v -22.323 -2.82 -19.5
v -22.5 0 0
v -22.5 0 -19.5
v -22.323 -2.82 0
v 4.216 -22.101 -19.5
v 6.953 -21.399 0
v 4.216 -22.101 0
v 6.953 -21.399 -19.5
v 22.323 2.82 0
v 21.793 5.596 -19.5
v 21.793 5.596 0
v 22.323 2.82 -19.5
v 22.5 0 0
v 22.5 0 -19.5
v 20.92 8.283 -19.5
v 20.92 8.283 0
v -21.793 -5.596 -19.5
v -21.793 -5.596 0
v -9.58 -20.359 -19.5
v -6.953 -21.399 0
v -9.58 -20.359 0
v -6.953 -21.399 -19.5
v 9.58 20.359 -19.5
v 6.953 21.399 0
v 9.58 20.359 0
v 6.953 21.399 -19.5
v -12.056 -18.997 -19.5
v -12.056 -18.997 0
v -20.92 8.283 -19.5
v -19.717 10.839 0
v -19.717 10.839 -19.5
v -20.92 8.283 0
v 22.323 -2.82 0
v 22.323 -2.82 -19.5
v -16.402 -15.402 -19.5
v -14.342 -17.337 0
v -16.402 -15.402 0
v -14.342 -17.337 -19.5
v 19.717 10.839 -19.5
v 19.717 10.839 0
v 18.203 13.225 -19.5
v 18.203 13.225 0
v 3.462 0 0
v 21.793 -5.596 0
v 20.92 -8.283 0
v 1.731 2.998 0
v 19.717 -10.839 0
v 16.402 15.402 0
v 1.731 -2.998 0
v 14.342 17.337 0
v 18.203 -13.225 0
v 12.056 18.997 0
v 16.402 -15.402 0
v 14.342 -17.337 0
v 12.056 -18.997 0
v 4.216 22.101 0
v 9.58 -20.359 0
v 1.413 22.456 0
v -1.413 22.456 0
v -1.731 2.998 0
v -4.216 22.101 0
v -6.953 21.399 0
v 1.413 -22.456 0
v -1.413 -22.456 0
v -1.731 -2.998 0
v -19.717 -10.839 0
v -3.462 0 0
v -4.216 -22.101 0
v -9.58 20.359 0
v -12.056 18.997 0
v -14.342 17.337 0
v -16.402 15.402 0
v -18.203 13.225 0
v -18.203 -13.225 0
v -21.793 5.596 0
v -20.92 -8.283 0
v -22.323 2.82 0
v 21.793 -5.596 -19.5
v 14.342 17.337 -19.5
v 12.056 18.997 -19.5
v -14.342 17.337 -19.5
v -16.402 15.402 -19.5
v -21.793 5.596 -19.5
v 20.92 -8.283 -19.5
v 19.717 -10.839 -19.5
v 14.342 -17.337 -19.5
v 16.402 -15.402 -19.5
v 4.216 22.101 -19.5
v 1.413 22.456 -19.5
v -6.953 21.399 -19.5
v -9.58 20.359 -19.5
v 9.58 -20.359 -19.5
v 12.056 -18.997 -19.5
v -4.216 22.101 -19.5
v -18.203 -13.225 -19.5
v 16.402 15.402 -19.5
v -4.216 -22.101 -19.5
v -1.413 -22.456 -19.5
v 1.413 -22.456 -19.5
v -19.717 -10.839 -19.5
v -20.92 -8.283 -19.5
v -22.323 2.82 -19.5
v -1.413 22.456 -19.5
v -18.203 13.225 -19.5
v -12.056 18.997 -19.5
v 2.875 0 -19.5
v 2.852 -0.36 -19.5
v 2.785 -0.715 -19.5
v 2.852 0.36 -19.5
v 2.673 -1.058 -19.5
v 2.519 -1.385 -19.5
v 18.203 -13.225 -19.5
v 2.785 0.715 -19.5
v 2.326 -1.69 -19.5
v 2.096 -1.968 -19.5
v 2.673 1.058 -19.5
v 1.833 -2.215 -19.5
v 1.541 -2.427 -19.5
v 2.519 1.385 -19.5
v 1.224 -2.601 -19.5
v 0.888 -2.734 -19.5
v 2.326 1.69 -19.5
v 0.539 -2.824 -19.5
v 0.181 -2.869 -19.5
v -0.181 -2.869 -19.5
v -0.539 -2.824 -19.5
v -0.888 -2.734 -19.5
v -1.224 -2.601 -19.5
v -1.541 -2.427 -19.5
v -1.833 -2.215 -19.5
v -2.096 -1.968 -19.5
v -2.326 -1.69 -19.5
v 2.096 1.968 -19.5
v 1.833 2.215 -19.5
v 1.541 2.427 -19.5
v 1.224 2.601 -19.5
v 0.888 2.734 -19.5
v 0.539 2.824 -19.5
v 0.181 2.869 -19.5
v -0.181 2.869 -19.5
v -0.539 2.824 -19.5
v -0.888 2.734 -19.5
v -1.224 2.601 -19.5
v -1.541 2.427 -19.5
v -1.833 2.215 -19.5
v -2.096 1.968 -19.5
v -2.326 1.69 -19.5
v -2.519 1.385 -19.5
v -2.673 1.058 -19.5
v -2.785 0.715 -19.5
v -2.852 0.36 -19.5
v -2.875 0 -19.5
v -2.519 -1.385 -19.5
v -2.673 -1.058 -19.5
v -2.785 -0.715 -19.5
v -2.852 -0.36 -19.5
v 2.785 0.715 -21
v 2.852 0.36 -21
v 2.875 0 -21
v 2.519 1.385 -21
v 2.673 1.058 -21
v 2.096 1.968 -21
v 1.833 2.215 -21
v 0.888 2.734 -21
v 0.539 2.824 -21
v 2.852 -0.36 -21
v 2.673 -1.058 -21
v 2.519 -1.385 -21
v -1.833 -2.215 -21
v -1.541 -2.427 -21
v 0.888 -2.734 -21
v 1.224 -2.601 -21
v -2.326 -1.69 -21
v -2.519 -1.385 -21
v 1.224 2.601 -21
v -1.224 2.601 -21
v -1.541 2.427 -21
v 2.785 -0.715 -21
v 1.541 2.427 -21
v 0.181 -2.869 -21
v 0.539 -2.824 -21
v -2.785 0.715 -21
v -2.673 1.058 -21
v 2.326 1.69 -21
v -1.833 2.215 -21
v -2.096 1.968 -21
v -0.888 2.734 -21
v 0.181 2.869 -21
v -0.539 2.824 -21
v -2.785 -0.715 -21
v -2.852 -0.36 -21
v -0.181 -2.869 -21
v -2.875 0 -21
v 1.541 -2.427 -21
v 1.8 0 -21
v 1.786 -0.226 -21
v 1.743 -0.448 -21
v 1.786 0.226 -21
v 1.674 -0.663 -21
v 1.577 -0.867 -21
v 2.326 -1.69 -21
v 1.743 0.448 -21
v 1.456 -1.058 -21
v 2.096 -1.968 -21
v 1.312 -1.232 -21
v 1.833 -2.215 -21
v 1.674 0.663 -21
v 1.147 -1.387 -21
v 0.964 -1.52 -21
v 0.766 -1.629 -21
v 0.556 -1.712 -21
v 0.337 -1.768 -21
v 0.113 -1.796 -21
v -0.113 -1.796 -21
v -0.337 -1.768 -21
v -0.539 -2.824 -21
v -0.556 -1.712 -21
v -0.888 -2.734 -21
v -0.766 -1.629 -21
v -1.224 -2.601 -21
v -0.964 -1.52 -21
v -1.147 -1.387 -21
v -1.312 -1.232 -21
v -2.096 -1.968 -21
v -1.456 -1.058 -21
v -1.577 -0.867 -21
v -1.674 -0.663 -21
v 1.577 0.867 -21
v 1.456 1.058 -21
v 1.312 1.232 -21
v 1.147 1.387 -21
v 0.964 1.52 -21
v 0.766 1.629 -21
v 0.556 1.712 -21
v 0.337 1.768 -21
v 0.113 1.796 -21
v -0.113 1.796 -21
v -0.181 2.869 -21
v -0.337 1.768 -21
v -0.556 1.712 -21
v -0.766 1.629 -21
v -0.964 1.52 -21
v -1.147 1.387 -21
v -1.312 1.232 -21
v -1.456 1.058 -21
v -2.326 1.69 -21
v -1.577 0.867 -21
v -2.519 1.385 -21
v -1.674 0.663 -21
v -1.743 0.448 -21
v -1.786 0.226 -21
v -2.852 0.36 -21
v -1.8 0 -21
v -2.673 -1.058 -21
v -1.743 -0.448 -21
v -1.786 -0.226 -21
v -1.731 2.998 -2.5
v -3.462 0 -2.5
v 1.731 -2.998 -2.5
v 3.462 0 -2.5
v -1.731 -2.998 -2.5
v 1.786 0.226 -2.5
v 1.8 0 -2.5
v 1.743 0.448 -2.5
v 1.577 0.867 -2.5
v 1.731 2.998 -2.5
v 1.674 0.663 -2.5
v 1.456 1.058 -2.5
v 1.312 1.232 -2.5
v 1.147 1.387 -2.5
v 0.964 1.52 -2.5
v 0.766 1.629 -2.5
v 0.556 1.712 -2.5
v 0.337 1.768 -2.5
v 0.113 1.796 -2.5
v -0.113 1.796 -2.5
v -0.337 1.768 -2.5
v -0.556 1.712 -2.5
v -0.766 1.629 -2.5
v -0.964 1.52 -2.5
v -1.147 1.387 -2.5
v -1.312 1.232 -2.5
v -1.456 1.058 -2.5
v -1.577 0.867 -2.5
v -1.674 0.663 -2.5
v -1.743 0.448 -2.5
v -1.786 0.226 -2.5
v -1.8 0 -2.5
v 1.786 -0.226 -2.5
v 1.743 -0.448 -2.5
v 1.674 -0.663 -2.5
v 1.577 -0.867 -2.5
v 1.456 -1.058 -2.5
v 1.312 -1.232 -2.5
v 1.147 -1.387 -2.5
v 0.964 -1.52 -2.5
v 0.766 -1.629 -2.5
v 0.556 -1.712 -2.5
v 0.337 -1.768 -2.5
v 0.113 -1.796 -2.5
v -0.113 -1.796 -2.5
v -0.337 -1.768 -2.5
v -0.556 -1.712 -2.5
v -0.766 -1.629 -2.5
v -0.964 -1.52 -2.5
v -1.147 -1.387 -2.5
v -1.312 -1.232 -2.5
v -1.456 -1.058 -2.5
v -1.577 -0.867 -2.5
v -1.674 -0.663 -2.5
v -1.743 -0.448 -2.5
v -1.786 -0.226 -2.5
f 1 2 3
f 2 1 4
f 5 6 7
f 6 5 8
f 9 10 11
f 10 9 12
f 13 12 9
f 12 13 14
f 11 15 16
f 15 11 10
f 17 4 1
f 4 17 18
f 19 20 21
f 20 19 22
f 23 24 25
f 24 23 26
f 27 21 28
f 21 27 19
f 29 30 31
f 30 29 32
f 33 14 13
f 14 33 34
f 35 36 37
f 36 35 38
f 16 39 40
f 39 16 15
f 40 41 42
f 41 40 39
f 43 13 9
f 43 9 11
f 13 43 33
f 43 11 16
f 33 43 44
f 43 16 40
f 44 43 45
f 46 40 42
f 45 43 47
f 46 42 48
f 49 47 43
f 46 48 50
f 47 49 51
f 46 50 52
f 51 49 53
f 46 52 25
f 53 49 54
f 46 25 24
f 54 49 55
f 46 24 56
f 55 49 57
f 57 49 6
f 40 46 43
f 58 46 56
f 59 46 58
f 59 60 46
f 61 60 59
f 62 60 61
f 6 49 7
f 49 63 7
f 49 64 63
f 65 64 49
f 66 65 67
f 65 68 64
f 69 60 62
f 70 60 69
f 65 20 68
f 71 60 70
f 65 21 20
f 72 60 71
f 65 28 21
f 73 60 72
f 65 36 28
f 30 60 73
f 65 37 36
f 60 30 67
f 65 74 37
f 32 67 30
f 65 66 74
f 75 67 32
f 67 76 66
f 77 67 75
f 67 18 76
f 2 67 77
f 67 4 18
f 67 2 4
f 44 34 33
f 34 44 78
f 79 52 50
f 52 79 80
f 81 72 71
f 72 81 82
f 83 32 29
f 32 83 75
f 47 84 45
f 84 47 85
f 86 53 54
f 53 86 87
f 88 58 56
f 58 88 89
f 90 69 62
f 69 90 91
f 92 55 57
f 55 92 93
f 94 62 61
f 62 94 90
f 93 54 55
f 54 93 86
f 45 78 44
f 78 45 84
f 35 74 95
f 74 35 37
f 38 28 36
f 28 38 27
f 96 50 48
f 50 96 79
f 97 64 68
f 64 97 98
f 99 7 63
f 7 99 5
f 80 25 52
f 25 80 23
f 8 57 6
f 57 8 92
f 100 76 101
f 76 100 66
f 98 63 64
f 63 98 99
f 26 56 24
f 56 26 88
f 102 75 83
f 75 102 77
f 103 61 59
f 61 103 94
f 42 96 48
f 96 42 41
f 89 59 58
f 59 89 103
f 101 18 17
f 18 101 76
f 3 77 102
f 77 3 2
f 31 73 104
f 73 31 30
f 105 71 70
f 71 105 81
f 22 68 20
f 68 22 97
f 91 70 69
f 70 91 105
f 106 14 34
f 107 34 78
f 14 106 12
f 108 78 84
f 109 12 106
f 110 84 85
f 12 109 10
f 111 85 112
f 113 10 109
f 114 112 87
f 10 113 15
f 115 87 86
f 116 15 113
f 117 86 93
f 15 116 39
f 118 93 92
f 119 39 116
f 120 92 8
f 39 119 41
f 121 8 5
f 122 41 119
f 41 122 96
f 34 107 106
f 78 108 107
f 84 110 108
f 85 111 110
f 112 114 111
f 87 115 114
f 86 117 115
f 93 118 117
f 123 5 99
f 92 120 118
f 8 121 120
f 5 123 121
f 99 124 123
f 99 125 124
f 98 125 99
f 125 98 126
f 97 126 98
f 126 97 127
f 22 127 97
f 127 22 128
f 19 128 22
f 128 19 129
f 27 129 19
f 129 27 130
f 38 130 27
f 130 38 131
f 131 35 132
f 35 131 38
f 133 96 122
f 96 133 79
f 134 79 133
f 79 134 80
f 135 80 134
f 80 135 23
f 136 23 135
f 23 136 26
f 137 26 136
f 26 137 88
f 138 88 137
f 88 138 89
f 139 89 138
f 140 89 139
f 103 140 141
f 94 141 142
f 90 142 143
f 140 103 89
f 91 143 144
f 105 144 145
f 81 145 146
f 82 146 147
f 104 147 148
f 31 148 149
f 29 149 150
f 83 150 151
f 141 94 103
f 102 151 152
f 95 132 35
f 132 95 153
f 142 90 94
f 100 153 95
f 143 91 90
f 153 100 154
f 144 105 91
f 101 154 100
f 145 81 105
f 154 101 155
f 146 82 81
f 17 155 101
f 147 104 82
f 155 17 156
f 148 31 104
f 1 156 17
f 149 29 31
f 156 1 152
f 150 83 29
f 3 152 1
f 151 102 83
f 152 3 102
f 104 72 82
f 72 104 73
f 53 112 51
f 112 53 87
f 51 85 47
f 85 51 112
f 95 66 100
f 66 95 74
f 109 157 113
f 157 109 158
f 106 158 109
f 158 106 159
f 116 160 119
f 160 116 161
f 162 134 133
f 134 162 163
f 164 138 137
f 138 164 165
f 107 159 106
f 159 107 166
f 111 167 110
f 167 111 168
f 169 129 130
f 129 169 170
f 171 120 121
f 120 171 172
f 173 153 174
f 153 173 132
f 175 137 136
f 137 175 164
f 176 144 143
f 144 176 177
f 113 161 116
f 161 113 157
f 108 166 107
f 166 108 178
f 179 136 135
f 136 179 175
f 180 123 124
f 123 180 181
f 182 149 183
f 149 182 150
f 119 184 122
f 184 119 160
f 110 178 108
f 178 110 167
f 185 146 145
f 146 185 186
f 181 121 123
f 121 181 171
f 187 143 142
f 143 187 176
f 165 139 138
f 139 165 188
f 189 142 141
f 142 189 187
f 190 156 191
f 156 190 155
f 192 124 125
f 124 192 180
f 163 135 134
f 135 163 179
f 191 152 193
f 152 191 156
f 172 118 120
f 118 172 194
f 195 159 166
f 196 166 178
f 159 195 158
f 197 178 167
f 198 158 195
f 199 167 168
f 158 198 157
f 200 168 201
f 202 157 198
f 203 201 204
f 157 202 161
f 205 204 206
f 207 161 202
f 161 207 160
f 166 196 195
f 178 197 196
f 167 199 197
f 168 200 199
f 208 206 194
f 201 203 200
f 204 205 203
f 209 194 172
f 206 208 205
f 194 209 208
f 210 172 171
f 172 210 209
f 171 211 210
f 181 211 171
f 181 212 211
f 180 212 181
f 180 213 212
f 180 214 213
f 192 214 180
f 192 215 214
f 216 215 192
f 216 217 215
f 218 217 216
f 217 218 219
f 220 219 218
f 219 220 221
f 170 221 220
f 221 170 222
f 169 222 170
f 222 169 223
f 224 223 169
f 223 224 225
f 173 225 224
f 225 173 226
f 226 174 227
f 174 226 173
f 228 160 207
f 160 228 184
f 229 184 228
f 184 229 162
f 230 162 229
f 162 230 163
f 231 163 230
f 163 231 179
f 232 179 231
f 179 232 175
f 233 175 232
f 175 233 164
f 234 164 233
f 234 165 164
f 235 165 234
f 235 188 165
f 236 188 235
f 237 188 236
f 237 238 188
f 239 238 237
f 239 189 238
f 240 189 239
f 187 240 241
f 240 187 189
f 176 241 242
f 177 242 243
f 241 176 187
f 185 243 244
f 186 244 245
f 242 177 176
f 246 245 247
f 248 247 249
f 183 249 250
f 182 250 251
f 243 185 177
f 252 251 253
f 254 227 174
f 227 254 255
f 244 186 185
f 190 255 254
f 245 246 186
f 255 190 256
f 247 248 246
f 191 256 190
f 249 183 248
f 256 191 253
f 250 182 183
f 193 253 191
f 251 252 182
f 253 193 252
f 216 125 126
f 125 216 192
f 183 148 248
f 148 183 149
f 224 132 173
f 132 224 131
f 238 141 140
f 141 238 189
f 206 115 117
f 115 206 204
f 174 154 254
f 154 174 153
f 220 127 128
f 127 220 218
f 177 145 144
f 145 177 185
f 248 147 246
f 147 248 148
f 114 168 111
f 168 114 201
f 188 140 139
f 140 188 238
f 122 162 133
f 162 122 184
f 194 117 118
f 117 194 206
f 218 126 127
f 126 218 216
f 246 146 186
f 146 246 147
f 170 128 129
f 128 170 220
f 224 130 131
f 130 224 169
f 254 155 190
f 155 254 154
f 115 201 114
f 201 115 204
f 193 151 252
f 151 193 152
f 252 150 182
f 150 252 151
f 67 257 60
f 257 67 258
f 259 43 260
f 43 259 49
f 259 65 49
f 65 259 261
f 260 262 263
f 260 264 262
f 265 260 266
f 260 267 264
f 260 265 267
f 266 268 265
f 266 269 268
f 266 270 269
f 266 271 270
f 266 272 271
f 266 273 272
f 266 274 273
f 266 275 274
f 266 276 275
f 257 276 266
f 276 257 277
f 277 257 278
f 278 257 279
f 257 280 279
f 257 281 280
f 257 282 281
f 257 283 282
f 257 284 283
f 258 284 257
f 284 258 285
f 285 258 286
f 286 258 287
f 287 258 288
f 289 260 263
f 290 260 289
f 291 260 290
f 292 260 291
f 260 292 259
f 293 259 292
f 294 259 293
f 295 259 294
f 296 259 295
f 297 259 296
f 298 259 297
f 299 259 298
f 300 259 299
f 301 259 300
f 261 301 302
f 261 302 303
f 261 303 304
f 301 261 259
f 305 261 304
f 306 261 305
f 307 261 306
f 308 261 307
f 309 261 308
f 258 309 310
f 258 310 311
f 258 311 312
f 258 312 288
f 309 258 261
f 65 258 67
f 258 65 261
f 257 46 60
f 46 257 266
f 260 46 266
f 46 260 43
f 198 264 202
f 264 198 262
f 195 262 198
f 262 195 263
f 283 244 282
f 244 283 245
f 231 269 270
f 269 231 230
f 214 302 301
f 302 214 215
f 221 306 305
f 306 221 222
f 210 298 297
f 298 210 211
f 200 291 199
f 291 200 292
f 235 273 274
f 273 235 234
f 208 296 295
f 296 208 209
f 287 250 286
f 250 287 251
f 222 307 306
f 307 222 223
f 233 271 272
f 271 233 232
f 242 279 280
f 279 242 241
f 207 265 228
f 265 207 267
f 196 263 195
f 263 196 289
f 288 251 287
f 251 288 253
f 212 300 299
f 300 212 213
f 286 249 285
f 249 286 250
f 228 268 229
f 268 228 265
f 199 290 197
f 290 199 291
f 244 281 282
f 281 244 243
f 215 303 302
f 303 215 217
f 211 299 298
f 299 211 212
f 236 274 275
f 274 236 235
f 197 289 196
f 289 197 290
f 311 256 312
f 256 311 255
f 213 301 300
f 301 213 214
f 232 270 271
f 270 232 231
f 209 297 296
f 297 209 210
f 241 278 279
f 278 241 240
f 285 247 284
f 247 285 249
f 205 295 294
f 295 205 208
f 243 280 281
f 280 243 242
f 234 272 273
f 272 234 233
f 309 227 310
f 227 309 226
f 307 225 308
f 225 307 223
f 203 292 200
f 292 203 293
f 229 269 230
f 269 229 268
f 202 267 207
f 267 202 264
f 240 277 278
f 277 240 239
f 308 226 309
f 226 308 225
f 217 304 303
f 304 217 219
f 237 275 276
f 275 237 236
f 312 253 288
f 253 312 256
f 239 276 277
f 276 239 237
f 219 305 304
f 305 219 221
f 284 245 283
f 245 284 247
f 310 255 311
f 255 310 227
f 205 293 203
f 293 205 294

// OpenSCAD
$fn = 50;

difference() {
	union() {
		translate(v = [0, 0, -19.5]) {
			cylinder(h = 19.5, r = 22.5);
		}
		#translate(v = [0, 0, -21.0]) {
			cylinder(h = 21, r = 2.875);
		}
	}
	union() {
		translate(v = [0, 0, 0]) {
			rotate(a = [0, 0, 0]) {
				difference() {
					union() {
						translate(v = [0, 0, -2.5]) {
							linear_extrude(height = 2.5) {
								polygon(points = [[3.4619999999999997, 0.0], [1.7310000000000003, 2.9981799479017264], [-1.7309999999999992, 2.9981799479017264], [-3.4619999999999997, 4.2397272186481365e-16], [-1.7310000000000014, -2.998179947901726], [1.7309999999999977, -2.9981799479017277]]);
							}
						}
					}
					union();
				}
			}
		}
		#translate(v = [0, 0, -100.0]) {
			cylinder(h = 200, r = 1.8);
		}
	}
}
